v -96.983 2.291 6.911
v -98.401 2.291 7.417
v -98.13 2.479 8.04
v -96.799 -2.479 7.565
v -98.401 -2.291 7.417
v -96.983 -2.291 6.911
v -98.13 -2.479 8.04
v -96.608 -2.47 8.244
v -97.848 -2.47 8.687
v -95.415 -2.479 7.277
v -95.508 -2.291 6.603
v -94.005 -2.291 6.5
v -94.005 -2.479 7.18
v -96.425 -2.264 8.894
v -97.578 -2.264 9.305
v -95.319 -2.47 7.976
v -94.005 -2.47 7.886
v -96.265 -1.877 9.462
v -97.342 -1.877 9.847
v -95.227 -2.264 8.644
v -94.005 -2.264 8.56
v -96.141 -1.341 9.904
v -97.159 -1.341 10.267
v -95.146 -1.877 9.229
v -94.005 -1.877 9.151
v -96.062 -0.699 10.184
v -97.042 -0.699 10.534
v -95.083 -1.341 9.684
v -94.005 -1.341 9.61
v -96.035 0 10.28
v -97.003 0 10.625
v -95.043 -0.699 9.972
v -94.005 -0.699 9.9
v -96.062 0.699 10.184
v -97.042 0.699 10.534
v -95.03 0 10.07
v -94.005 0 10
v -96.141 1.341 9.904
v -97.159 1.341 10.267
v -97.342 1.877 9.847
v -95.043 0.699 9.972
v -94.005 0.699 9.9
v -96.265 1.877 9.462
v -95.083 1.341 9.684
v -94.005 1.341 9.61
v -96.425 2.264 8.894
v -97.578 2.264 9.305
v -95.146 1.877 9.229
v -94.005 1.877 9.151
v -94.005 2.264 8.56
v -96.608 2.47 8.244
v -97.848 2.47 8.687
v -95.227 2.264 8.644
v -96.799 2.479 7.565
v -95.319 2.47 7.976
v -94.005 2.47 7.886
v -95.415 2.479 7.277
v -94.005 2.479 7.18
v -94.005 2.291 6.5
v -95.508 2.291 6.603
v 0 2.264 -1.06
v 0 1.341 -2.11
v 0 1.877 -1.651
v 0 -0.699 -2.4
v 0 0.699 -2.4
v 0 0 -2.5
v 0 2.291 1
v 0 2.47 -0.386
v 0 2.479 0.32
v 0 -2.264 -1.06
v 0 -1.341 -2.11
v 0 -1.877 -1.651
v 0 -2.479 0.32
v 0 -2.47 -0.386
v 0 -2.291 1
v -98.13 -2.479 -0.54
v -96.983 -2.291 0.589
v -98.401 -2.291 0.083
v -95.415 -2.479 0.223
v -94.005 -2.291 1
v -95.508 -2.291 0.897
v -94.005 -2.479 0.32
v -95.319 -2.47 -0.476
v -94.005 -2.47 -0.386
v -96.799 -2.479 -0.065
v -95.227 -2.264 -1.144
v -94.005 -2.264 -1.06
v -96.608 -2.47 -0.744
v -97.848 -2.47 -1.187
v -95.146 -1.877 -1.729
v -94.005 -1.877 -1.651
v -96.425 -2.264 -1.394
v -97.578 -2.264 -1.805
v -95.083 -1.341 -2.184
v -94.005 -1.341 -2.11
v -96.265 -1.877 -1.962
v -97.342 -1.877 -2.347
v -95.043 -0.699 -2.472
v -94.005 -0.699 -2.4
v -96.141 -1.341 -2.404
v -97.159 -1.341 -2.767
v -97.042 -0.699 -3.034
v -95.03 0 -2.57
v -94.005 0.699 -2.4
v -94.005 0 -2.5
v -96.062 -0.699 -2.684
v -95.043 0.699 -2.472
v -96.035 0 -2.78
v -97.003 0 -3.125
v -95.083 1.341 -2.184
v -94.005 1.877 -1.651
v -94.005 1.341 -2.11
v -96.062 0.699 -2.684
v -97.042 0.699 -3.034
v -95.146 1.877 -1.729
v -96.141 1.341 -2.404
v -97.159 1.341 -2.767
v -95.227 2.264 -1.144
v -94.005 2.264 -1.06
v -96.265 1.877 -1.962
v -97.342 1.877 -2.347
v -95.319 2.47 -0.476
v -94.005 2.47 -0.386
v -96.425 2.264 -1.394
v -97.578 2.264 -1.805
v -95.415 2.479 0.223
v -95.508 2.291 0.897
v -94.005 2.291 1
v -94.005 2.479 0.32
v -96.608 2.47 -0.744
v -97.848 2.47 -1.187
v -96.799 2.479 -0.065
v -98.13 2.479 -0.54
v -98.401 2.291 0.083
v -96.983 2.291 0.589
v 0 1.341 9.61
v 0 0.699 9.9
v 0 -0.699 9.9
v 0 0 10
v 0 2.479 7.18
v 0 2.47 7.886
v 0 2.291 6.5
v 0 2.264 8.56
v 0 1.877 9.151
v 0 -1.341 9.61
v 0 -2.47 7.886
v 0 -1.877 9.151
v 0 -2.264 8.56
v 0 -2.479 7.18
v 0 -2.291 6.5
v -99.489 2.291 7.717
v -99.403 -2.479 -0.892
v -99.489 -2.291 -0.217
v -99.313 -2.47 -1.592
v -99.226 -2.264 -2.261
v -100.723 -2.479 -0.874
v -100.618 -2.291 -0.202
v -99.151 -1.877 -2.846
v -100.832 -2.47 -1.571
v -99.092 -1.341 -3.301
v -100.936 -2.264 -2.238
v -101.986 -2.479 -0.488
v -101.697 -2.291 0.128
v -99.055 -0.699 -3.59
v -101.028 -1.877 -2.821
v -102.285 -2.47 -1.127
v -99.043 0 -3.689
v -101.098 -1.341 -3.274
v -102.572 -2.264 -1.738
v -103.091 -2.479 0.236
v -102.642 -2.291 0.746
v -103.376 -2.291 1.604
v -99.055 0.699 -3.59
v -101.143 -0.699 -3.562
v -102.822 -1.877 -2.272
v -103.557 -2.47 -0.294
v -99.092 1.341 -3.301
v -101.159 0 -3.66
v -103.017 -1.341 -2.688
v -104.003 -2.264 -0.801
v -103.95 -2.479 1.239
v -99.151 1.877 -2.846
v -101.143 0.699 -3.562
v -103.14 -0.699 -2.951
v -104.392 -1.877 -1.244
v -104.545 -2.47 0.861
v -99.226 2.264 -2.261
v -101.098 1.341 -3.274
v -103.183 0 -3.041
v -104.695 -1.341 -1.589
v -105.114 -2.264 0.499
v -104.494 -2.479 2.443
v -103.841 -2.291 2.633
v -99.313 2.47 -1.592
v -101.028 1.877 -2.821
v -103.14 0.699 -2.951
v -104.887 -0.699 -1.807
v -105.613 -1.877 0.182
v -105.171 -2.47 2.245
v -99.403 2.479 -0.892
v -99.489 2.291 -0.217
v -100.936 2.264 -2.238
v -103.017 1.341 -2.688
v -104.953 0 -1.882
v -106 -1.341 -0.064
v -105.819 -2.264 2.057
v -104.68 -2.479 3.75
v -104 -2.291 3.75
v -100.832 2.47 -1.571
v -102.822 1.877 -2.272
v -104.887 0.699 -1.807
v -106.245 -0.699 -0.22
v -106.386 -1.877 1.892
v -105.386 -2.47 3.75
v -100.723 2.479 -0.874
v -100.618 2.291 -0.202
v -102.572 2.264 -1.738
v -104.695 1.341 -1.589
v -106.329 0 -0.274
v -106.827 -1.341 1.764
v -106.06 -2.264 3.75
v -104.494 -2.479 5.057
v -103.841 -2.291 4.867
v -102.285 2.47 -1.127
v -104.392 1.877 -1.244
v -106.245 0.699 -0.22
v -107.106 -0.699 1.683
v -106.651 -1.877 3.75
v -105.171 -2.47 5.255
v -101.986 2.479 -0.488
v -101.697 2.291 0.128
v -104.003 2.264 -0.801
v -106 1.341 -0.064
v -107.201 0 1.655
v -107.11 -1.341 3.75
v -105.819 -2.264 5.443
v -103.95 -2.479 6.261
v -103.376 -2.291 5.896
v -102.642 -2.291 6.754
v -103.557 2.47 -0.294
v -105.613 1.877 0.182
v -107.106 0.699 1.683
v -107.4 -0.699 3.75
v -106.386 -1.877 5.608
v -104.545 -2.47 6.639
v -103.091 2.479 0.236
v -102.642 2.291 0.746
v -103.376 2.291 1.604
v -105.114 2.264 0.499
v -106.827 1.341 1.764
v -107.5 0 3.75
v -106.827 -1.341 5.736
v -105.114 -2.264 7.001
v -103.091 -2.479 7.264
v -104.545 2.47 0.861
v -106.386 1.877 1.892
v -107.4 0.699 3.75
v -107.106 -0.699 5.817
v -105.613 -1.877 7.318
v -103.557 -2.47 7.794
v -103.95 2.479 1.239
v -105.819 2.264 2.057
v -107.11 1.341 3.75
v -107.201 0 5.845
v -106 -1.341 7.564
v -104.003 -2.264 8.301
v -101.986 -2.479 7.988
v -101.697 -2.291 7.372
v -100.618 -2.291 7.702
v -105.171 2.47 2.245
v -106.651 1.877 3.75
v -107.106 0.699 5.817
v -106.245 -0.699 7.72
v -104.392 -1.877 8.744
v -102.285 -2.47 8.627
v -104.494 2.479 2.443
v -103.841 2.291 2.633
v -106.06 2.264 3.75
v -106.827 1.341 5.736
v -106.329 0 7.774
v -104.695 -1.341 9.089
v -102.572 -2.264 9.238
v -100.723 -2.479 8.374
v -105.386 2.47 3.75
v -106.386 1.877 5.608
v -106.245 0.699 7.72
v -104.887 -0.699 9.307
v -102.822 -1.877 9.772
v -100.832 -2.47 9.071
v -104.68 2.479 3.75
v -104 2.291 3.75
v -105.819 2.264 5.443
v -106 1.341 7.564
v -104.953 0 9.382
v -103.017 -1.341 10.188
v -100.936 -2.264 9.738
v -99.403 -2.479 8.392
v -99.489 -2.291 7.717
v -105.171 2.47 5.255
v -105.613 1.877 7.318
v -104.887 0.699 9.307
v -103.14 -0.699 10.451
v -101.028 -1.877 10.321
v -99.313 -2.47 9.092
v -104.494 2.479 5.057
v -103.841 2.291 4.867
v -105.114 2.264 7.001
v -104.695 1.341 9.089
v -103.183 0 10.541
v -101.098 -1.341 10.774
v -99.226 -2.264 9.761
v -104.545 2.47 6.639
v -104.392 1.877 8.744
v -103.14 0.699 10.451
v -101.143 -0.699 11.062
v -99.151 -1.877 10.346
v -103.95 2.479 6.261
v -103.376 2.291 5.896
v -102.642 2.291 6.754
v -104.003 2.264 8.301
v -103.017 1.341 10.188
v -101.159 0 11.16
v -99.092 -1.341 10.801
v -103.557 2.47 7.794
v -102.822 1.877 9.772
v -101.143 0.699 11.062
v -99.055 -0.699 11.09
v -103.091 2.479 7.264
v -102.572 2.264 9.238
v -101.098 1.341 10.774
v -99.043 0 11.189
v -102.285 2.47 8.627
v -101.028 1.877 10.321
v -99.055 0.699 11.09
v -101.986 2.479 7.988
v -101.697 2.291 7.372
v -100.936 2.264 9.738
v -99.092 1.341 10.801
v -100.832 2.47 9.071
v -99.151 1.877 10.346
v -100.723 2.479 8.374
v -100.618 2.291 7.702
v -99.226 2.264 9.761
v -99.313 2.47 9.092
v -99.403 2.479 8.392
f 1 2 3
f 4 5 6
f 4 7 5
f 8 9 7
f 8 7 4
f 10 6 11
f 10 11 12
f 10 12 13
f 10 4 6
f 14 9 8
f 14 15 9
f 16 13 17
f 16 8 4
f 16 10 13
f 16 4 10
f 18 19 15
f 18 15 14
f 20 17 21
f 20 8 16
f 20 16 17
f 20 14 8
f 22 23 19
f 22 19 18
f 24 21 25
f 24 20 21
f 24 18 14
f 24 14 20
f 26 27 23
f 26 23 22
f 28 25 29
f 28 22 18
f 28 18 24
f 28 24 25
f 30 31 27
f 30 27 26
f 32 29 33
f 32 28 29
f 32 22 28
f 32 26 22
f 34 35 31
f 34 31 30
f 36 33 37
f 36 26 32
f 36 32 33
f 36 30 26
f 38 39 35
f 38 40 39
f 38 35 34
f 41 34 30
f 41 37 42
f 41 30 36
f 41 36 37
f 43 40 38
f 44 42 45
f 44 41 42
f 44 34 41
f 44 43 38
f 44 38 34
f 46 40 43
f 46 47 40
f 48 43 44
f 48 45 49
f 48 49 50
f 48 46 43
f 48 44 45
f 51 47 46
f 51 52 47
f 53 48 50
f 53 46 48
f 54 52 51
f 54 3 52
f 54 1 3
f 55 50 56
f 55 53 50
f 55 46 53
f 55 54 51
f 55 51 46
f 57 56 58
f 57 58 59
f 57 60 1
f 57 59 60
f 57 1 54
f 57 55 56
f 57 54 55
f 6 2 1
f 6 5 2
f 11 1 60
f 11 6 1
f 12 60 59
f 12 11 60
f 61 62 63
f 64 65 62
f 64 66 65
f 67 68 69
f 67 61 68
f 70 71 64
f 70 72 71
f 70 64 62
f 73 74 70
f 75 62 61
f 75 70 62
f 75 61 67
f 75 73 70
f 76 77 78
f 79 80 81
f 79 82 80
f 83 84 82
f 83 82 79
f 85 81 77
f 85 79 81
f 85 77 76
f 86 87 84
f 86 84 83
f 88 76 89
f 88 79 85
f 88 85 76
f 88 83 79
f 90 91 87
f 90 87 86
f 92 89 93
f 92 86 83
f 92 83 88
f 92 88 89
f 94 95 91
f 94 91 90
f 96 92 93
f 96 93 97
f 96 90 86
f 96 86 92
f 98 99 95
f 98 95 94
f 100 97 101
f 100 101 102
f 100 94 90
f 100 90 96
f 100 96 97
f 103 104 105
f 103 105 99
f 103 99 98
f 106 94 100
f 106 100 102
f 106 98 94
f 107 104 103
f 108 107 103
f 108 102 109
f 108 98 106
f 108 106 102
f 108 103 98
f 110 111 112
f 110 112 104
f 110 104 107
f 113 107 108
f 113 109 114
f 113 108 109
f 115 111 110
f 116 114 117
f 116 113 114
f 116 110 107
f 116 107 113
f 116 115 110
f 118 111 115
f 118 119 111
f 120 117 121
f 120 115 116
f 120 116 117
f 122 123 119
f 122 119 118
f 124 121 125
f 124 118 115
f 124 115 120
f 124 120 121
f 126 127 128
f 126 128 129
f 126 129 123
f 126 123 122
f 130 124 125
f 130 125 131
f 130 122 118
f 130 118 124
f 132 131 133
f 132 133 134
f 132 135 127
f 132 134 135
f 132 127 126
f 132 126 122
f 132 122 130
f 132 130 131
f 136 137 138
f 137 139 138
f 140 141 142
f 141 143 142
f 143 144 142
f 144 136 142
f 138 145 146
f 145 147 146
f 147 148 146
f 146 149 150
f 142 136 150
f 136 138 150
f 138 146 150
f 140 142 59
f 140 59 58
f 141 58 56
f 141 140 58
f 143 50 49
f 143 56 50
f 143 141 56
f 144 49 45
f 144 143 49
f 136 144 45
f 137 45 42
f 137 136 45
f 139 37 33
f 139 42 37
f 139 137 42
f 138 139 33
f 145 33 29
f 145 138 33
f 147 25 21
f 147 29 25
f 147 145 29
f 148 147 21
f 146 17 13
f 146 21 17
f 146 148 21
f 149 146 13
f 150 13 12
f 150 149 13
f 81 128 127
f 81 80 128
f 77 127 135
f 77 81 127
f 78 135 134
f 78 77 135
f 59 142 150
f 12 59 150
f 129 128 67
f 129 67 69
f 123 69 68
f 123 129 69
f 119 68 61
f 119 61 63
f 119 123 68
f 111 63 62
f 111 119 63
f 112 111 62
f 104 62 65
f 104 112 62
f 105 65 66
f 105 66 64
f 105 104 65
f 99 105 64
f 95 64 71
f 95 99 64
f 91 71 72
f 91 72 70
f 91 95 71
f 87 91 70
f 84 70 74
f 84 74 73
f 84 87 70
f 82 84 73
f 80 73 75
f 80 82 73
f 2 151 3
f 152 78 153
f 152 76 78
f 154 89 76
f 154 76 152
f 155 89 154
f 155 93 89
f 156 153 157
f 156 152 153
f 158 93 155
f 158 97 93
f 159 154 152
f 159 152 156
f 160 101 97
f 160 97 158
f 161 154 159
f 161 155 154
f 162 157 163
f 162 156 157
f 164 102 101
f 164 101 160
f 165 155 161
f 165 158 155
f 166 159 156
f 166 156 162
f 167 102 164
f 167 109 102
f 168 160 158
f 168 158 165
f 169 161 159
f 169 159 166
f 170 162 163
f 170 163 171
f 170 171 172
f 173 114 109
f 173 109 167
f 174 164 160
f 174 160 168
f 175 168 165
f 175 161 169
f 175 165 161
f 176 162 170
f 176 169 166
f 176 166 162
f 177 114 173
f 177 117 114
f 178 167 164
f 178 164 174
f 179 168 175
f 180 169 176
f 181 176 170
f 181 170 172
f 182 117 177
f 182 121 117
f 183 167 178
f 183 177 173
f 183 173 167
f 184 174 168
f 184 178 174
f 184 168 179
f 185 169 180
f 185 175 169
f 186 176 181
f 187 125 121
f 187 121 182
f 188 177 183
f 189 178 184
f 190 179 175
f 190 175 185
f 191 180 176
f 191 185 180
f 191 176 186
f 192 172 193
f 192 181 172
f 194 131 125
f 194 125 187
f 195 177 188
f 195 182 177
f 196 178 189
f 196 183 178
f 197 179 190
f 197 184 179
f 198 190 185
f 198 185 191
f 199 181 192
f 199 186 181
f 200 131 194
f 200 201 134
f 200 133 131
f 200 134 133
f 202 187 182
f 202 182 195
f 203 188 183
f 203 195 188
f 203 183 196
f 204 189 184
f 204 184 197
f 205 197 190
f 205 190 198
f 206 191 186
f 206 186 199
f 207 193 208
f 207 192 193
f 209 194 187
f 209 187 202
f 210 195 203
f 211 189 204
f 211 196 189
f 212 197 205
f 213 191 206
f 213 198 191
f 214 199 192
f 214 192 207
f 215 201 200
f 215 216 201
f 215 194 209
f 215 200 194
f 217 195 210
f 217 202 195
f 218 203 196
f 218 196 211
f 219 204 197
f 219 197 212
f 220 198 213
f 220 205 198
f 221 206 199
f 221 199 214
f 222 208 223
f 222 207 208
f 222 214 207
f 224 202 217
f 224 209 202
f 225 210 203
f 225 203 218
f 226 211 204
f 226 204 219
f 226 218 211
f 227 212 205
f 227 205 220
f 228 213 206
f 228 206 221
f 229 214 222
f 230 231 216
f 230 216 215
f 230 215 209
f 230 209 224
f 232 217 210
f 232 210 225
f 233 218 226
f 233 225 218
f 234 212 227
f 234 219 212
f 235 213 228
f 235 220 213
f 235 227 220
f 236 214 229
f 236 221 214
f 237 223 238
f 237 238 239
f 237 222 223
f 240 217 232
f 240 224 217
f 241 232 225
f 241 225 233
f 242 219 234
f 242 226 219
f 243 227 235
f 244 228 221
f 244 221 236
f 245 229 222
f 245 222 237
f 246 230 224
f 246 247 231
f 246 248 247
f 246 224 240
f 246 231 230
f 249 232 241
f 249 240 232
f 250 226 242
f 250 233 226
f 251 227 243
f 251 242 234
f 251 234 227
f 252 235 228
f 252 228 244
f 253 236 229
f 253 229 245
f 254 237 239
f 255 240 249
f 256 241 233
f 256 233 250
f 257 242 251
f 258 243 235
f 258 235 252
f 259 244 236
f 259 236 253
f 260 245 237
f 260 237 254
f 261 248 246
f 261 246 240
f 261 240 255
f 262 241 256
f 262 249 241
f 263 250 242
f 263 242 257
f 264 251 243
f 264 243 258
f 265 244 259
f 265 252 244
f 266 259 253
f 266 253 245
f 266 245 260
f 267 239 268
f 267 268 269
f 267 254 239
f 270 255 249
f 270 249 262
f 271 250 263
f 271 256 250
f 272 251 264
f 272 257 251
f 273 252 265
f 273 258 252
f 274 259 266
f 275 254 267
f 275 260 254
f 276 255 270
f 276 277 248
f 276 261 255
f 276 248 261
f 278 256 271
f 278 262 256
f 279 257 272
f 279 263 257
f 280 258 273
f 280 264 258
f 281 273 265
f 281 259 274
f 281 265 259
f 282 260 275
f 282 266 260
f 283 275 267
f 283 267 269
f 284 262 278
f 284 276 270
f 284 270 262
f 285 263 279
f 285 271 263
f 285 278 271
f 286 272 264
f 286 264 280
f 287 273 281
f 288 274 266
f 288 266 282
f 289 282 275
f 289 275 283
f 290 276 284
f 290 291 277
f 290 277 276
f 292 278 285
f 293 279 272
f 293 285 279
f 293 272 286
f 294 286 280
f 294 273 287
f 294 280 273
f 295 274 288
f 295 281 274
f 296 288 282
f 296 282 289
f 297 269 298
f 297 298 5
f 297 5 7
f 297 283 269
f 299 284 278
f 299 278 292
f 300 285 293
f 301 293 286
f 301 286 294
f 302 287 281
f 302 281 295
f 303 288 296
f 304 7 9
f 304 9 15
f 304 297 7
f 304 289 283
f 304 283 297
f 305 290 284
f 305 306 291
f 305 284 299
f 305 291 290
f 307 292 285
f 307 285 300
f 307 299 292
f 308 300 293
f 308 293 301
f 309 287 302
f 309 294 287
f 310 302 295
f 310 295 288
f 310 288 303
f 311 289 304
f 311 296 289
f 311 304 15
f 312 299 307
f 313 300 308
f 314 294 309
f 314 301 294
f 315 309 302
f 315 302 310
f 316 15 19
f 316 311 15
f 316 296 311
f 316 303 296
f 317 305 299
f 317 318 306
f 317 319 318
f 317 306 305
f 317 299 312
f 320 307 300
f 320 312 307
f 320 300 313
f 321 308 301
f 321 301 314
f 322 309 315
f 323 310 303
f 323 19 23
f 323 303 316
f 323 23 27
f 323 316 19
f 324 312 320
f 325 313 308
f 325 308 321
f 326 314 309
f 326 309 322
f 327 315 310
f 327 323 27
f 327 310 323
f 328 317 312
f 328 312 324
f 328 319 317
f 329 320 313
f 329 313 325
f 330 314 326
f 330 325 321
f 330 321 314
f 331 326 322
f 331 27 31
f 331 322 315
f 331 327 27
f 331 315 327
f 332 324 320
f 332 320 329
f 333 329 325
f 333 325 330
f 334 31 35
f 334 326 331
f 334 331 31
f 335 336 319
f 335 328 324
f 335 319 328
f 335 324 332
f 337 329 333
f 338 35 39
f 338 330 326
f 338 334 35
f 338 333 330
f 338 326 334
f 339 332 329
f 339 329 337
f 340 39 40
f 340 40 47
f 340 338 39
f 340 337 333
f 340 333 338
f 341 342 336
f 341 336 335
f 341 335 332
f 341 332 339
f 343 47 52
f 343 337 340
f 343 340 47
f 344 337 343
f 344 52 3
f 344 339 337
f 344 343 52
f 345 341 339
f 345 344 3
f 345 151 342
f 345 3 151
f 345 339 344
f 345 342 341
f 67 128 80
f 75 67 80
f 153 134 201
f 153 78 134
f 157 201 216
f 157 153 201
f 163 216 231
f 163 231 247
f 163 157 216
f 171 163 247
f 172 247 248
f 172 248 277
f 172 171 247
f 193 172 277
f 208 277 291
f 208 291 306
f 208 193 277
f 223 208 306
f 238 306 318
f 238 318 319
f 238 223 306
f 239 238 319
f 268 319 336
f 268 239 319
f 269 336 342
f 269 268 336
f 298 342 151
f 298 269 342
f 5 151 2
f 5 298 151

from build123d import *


with BuildPart() as part:
    # Sweep1: sweep along a path in Path
    with BuildLine(Plane(origin=(0, 0, 0), x_dir=(1, 0, 0), z_dir=(0, 1, 0))) as sweep1_path:
        Line((0, 0), (-94.005210596, 0))
        ThreePointArc((-94.005210596, 0), (-96.046452048, 0.210549896), (-98.001736865, 0.833333333))
        ThreePointArc((-98.001736865, 0.833333333), (-105, -3.75), (-98.001736865, -8.333333333))
        ThreePointArc((-98.001736865, -8.333333333), (-96.046452048, -7.710549896), (-94.005210596, -7.5))
        Line((-94.005210596, -7.5), (0, -7.5))
    # Cross-section → Sweep1 (sweep)
    with BuildSketch(Plane(origin=(0, 0, 0), x_dir=(0, 0, -1), z_dir=(1, 0, 0))):
        with BuildLine():
            Line((-1, 2.291287847), (-1, -2.291287847))
            ThreePointArc((-1, -2.291287847), (2.5, 0), (-1, 2.291287847))
        make_face()
    sweep(path=sweep1_path.line)


solid = part.part
